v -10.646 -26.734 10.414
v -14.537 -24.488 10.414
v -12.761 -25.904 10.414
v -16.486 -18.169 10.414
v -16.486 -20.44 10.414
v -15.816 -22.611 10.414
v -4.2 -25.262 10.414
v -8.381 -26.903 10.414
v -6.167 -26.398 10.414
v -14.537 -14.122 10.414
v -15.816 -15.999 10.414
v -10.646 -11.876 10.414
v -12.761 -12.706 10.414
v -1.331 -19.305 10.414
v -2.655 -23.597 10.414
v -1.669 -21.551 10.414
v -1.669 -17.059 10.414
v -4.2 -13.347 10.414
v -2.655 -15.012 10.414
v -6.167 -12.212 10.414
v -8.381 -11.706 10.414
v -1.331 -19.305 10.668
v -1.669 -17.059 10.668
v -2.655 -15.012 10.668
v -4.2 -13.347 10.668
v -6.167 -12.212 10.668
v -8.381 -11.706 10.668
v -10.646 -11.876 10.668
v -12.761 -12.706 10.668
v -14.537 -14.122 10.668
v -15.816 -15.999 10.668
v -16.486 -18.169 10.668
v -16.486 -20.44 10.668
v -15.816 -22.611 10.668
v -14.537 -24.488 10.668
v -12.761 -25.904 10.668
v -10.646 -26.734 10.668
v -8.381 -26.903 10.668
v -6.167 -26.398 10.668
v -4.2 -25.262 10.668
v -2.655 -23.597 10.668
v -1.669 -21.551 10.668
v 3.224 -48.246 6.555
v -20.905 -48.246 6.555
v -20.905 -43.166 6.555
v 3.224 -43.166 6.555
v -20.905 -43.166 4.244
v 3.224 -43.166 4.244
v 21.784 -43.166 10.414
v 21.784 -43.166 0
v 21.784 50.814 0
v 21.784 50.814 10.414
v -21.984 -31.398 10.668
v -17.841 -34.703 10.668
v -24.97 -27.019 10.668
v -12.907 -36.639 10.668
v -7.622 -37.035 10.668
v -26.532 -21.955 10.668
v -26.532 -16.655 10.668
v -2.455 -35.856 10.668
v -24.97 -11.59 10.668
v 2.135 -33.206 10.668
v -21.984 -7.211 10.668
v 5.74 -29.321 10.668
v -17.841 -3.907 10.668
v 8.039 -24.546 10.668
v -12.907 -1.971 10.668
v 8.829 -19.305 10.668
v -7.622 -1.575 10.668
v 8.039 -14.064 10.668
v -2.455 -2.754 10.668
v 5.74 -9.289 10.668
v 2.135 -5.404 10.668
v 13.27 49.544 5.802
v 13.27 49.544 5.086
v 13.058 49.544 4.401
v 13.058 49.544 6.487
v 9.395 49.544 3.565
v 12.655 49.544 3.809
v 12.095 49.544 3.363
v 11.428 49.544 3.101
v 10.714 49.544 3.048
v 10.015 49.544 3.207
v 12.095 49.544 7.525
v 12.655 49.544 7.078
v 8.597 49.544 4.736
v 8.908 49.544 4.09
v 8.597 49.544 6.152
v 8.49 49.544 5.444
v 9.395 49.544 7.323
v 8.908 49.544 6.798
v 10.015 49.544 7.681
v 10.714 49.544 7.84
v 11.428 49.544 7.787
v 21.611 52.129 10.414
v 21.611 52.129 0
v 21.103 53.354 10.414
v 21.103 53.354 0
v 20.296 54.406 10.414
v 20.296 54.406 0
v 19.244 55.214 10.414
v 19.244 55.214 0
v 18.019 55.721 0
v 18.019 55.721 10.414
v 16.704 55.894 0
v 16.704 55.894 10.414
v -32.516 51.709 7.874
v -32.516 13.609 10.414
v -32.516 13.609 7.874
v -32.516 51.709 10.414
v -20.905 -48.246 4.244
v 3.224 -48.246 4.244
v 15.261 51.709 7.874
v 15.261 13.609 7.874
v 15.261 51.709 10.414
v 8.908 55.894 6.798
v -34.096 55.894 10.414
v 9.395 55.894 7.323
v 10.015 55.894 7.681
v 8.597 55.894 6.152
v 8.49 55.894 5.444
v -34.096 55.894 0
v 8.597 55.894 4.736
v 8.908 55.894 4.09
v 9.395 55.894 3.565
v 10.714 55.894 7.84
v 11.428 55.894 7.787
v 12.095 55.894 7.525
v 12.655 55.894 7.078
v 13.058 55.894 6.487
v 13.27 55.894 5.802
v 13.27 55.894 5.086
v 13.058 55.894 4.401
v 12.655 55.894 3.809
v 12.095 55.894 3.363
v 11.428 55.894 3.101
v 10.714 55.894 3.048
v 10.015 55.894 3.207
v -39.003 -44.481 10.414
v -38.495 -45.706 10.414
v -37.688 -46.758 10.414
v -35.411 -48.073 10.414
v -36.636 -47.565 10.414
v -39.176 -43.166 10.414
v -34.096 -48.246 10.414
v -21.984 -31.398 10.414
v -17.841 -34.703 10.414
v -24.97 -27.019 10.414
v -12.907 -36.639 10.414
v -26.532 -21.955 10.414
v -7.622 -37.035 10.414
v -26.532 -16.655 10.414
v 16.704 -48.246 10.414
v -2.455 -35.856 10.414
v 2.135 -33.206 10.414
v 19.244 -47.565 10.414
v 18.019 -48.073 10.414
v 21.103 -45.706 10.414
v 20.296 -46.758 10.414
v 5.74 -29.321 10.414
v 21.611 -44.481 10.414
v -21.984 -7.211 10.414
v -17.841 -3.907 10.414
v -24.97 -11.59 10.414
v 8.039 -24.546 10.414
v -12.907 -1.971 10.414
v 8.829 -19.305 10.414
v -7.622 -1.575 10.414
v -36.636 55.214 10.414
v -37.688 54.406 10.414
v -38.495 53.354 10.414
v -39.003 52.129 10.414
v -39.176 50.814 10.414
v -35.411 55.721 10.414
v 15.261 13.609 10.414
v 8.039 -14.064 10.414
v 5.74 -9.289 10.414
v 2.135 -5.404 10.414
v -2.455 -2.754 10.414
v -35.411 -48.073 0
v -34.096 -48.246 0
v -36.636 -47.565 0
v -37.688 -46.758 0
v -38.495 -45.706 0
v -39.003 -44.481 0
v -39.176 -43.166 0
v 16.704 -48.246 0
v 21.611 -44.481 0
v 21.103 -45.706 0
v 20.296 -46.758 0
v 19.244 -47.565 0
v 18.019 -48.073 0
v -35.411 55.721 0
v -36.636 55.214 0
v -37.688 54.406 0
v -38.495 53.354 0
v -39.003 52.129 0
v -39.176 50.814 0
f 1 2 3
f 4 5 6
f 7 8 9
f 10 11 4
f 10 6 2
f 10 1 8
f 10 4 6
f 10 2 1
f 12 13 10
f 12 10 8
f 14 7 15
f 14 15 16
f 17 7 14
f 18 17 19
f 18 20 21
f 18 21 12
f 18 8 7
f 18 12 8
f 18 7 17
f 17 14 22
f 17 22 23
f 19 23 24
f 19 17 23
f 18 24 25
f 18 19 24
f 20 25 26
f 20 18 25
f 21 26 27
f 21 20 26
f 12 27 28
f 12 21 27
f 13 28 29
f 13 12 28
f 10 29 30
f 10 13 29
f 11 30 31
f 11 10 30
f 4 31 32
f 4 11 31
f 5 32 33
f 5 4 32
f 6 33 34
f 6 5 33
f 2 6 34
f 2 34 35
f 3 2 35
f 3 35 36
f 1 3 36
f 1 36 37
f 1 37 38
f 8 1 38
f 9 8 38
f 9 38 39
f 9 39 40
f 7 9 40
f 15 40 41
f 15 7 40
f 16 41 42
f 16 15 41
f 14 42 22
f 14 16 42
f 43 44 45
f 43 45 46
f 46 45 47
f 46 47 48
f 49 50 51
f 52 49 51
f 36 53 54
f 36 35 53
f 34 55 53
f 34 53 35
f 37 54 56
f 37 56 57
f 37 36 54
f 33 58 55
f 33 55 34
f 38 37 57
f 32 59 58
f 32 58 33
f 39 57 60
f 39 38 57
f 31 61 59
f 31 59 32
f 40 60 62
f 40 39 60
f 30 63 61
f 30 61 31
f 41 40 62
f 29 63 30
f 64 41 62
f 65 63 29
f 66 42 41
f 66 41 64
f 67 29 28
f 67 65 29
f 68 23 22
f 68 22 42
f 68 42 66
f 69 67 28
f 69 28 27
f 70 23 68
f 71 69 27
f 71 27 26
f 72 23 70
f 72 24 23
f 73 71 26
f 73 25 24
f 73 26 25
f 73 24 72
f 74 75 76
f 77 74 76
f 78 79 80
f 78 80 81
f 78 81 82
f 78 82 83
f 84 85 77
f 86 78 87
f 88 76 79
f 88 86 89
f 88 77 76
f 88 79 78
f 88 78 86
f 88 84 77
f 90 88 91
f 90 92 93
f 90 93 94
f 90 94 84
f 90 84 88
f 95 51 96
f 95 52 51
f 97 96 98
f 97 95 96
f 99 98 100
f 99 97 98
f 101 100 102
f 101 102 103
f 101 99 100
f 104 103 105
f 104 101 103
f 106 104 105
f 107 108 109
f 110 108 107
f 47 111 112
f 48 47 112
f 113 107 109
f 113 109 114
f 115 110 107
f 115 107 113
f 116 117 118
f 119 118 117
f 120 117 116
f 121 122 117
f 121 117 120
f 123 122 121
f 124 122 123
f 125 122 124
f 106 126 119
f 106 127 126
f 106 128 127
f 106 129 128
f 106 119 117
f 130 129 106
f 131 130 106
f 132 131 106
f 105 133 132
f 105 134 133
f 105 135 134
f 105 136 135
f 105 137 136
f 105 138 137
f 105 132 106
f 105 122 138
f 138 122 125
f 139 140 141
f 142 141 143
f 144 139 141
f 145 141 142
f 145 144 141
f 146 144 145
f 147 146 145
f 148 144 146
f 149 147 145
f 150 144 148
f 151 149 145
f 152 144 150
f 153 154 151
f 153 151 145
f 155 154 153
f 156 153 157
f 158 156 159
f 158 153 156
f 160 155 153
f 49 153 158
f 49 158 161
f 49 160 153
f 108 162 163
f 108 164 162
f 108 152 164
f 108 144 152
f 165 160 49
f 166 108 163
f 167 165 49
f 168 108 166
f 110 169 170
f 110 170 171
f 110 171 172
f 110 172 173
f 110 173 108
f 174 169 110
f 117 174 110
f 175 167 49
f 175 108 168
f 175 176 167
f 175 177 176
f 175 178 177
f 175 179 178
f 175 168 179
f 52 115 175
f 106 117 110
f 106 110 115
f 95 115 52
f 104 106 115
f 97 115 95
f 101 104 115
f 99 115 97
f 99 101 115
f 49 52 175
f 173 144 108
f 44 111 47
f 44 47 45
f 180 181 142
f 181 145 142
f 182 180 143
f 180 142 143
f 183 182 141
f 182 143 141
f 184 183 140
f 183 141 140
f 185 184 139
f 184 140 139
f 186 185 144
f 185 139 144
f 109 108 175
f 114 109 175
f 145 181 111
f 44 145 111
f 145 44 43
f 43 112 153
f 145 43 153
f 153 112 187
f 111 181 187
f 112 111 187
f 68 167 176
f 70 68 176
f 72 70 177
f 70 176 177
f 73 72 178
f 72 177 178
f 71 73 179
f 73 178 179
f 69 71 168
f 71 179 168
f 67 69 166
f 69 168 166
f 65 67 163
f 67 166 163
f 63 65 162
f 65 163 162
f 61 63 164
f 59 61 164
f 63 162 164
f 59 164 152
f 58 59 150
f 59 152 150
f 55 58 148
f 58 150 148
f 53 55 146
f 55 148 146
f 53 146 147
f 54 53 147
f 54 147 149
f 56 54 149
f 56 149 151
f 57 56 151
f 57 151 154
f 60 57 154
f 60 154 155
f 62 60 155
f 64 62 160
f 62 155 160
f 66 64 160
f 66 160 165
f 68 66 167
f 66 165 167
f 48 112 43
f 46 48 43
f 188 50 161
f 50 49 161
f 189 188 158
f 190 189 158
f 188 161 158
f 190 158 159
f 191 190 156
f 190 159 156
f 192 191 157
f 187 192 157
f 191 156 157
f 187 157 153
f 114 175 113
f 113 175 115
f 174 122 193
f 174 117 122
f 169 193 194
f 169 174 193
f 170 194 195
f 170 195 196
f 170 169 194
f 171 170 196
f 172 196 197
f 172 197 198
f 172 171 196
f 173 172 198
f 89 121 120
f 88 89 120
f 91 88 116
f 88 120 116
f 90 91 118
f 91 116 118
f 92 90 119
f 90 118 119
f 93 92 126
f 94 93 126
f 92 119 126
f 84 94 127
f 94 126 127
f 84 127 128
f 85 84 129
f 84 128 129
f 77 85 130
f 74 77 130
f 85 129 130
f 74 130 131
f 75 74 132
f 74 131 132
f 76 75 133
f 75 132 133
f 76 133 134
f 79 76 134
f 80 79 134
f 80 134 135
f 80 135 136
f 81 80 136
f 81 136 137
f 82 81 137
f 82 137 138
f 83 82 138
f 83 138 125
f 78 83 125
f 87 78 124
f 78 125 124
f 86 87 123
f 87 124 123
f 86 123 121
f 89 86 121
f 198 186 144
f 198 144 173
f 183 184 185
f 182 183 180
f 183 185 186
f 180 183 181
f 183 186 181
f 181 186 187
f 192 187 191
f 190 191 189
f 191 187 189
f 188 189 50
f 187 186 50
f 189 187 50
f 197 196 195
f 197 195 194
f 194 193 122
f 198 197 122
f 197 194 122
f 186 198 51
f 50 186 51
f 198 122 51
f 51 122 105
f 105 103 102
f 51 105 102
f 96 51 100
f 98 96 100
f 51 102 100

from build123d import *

# Parameters (mm, degrees)
F0_W      = 60.96
F0_H      = 104.14
F1_DEPTH  = 10.414
F2_R      = 5.08
F3_R      = 5.08
F4_R      = 5.08
F5_R      = 5.08
F6_W      = 47.776191
F6_H      = 38.1
F8_DEPTH  = 2.54
F7_R      = 17.78
F7_R_2    = 7.62
F9_DEPTH  = 0.254
F10_R     = 2.403012
F11_DEPTH = 6.35
F12_W     = 24.128942
F12_H     = 2.311272
F13_DEPTH = 5.08


with BuildPart() as f1:
    # F0 (on Top) → F1 (new body)
    with BuildSketch(Plane.XY):
        with Locations((-8.696019, 3.824193)):
            Rectangle(F0_W, F0_H)
    extrude(amount=F1_DEPTH)

    # F2
    f2_edges = [f1.edges().sort_by_distance(p)[0] for p in [
        (21.783981, 55.894193, 5.207),
    ]]
    fillet(f2_edges, radius=F2_R)

    # F3
    f3_edges = [f1.edges().sort_by_distance(p)[0] for p in [
        (-39.176019, 55.894193, 5.207),
    ]]
    fillet(f3_edges, radius=F3_R)

    # F4
    f4_edges = [f1.edges().sort_by_distance(p)[0] for p in [
        (21.783981, -48.245807, 5.207),
    ]]
    fillet(f4_edges, radius=F4_R)

    # F5
    f5_edges = [f1.edges().sort_by_distance(p)[0] for p in [
        (-39.176019, -48.245807, 5.207),
    ]]
    fillet(f5_edges, radius=F5_R)

    # F6 (on face) → F8 (cut)
    with BuildSketch(Plane.XY.offset(10.414)):
        with Locations((-8.627544, 32.658872)):
            Rectangle(F6_W, F6_H)
    extrude(amount=-F8_DEPTH, mode=Mode.SUBTRACT)

    # F7 (on face) → F9 (join)
    with BuildSketch(Plane.XY.offset(10.414)):
        with Locations((-8.950802, -19.304793)):
            Circle(F7_R)
        with Locations((-8.950802, -19.304793)):
            Circle(F7_R_2, mode=Mode.SUBTRACT)
    extrude(amount=F9_DEPTH)

    # F10 (on face) → F11 (cut)
    with BuildSketch(Plane(origin=(0, 55.894193, 0), x_dir=(-1, 0, 0), z_dir=(0, 1, 0))):
        with Locations((-10.893411, 5.443895)):
            Circle(F10_R)
    extrude(amount=-F11_DEPTH, mode=Mode.SUBTRACT)

    # F12 (on face) → F13 (cut)
    with BuildSketch(Plane.XZ.offset(48.245807)):
        with Locations((-8.840048, 5.399611)):
            Rectangle(F12_W, F12_H)
    extrude(amount=-F13_DEPTH, mode=Mode.SUBTRACT)


solid = f1.part
